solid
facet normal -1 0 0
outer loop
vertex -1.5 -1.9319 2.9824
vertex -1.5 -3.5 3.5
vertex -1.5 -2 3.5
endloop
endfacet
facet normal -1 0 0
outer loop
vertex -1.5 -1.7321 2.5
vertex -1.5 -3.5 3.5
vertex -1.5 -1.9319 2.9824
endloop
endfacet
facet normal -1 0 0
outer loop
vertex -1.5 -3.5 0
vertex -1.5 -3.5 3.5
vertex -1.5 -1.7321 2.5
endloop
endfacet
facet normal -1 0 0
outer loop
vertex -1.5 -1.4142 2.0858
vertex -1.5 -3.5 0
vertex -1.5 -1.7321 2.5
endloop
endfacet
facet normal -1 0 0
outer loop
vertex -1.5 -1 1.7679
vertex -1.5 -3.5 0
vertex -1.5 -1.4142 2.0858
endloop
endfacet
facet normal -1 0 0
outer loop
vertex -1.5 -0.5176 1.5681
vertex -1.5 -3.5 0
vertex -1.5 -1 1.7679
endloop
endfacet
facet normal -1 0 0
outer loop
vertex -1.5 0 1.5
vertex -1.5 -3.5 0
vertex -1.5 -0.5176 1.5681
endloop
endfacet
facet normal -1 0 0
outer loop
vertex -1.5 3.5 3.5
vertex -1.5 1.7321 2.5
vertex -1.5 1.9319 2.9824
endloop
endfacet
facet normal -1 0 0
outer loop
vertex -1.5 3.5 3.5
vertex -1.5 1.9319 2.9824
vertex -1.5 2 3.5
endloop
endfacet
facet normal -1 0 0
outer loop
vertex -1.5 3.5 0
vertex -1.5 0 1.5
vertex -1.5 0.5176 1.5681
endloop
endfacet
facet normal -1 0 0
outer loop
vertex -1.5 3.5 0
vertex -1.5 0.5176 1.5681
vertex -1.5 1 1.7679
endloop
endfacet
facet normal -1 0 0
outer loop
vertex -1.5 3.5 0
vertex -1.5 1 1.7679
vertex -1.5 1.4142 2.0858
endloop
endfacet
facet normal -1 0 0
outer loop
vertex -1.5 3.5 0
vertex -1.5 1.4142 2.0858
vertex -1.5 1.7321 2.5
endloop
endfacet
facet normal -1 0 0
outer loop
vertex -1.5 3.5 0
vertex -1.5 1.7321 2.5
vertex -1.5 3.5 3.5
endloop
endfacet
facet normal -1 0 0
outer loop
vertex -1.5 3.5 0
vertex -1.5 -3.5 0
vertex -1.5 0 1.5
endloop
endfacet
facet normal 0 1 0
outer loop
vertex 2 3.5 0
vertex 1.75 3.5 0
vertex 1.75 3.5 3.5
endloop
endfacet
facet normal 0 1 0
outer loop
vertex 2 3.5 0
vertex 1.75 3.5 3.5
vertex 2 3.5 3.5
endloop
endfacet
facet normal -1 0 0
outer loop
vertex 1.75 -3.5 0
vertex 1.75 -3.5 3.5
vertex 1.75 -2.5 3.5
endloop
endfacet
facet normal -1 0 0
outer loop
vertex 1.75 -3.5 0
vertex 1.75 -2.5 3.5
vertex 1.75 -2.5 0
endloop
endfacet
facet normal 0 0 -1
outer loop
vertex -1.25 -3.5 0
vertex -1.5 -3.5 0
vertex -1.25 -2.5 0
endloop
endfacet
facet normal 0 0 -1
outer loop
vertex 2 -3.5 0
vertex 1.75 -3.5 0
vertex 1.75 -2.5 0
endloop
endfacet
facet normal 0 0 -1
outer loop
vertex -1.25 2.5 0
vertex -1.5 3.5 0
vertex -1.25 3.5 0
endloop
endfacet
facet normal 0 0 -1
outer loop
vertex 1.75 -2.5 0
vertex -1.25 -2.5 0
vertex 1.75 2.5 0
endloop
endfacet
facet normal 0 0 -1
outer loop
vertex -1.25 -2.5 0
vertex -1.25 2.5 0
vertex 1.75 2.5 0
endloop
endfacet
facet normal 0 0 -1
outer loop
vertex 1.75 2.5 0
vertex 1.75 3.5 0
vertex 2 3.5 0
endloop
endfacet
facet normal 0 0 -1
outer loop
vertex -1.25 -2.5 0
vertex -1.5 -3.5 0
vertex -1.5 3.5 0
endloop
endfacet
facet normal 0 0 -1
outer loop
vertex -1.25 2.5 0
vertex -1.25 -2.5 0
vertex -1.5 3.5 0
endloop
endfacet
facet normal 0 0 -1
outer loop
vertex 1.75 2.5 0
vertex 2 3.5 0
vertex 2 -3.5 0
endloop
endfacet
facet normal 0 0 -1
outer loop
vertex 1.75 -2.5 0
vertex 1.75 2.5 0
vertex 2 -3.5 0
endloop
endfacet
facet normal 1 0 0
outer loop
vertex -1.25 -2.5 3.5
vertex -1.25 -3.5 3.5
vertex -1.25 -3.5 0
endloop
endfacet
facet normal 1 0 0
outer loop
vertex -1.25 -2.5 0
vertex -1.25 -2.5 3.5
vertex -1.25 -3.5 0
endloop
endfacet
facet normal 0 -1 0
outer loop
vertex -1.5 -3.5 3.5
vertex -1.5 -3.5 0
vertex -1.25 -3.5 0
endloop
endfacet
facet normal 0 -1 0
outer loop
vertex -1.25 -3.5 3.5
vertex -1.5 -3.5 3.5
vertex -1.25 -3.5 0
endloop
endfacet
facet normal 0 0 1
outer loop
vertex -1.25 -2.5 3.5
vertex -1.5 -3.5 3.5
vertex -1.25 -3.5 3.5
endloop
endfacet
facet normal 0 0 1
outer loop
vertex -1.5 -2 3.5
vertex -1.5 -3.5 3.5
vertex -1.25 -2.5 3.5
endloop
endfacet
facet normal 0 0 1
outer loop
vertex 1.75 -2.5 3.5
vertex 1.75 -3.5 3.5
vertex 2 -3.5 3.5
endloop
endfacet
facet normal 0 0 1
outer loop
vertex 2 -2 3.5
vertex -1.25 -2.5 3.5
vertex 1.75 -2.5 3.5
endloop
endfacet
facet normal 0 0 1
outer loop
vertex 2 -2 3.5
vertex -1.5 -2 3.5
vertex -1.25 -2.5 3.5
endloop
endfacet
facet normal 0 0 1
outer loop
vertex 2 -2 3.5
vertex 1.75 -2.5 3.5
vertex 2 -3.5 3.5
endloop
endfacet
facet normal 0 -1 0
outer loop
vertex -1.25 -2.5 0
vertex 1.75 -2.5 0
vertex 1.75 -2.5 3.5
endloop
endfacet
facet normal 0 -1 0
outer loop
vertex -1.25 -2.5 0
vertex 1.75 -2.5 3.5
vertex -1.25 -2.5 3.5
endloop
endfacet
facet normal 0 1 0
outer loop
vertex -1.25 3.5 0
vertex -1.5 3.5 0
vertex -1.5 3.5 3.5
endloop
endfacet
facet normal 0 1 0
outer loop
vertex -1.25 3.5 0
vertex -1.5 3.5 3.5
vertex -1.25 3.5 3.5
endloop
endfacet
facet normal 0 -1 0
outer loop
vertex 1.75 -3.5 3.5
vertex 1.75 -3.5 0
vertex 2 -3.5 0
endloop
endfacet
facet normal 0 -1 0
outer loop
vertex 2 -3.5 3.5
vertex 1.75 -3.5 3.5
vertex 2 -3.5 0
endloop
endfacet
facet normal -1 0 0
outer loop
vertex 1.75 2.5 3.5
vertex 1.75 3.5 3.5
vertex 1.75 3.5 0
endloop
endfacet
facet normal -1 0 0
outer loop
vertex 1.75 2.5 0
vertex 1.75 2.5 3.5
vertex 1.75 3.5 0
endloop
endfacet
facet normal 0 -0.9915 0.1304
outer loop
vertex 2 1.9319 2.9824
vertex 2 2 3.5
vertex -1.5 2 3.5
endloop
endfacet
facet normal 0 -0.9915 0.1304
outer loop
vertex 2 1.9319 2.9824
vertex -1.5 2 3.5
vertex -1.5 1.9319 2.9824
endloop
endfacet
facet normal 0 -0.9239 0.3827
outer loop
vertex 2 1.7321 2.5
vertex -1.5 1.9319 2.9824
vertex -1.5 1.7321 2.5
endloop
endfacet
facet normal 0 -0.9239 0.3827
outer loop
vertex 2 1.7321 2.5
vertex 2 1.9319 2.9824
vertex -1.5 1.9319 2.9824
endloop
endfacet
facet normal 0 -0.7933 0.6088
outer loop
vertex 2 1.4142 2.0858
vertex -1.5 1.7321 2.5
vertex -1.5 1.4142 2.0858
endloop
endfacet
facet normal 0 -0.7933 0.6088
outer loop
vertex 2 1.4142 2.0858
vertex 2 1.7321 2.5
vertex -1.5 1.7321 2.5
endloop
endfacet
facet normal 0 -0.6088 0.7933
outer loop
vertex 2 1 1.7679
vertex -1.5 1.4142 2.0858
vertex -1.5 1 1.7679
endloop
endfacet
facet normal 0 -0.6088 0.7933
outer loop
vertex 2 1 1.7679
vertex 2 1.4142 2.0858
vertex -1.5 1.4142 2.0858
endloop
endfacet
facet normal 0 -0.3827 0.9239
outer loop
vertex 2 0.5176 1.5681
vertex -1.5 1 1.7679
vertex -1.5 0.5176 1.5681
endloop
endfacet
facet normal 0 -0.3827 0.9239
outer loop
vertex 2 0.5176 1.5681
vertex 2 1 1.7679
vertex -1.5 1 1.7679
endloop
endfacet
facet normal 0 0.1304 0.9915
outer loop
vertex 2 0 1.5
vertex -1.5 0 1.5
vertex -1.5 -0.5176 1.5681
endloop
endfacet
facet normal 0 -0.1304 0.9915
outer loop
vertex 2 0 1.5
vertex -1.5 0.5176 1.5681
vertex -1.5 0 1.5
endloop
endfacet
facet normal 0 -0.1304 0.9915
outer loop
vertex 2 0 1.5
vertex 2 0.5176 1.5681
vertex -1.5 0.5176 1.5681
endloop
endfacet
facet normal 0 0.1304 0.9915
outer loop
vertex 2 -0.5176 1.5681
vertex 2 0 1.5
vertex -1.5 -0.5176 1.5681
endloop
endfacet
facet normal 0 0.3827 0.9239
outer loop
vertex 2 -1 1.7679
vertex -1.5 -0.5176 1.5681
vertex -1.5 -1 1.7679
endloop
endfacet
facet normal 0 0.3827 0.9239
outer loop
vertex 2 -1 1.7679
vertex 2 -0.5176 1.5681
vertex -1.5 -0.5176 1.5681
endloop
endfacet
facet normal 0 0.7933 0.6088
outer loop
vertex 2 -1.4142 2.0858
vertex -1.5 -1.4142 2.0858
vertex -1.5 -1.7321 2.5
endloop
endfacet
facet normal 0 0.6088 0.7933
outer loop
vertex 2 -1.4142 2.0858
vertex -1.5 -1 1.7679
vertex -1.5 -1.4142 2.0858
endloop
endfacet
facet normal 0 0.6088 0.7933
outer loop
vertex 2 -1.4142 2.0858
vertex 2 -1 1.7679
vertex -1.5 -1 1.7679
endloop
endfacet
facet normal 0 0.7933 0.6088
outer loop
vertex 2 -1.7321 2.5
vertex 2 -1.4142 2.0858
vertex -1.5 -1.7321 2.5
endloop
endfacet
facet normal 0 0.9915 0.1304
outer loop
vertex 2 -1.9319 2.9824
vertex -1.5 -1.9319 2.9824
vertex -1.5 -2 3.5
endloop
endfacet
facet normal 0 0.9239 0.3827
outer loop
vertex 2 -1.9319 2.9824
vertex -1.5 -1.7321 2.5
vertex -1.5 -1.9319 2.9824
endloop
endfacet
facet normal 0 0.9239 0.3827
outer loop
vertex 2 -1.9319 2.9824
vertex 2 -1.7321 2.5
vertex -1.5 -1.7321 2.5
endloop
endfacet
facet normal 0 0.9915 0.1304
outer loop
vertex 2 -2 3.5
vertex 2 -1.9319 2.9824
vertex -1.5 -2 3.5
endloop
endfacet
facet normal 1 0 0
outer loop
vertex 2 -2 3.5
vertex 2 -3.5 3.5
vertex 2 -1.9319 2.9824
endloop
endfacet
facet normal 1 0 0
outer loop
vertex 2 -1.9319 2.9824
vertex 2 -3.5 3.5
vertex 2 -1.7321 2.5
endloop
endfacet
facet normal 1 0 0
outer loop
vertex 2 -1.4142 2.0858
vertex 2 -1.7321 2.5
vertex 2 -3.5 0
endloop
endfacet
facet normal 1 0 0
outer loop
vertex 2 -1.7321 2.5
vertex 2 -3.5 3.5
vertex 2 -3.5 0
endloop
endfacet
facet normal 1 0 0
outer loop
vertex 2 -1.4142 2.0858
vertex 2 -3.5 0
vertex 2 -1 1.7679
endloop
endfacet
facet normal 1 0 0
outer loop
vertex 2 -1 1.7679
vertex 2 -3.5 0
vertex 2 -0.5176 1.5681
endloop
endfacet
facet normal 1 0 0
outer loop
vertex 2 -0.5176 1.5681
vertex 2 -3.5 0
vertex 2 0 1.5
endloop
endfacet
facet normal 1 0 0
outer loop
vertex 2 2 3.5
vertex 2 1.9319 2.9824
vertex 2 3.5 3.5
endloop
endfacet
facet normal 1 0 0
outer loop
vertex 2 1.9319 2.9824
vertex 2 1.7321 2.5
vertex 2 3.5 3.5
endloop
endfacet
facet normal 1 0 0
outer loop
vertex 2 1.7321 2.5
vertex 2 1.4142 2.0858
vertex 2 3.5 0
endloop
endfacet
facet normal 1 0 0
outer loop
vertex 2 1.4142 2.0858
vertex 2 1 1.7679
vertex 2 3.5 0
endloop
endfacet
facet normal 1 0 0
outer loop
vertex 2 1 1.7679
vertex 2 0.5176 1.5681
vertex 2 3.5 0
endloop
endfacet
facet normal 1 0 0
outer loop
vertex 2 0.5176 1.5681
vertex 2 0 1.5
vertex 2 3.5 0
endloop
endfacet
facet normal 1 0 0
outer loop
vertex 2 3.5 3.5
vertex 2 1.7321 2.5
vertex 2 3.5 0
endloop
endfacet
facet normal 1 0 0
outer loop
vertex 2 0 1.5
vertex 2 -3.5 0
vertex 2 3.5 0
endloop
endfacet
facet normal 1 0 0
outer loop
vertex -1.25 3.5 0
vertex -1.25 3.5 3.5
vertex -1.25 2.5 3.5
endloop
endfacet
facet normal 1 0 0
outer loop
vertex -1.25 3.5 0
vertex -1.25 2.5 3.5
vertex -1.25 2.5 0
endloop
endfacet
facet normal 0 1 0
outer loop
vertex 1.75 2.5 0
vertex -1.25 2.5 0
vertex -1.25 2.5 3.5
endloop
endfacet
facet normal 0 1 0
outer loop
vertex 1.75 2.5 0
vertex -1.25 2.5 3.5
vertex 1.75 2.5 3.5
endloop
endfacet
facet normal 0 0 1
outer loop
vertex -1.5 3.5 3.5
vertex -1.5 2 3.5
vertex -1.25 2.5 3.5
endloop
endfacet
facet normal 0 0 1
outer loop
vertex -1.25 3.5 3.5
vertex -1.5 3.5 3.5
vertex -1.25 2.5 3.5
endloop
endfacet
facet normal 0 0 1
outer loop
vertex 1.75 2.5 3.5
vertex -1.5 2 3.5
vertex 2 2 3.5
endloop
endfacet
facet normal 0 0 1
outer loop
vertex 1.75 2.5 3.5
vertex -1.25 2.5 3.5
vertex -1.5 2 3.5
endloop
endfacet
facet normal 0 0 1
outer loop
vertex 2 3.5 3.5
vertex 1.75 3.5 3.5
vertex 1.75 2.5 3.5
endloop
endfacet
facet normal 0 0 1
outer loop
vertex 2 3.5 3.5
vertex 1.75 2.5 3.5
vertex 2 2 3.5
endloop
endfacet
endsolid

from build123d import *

# Parameters (mm, degrees)
ESQUISSE1_W             = 3.5
ESQUISSE1_H             = 7
BOSS_EXTRU_1_DEPTH      = 3.5
ESQUISSE2_W             = 3
ESQUISSE2_H             = 3.5
ENL_V_MAT_EXTRU_1_DEPTH = 1
ESQUISSE3_W             = 3
ESQUISSE3_H             = 3.5
ENL_V_MAT_EXTRU_2_DEPTH = 1
ENL_V_MAT_EXTRU_4_DEPTH = 10


with BuildPart() as part:
    # Esquisse1 → Boss.-Extru.1 (new body)
    with BuildSketch(Plane.XY):
        with Locations((0.25, 0)):
            Rectangle(ESQUISSE1_W, ESQUISSE1_H)
    extrude(amount=BOSS_EXTRU_1_DEPTH)

    # Esquisse2 → Enlèv. mat.-Extru.1 (cut)
    with BuildSketch(Plane(origin=(0, 3.5, 0), x_dir=(1, 0, 0), z_dir=(0, 1, 0))):
        with Locations((0.25, -1.75)):
            Rectangle(ESQUISSE2_W, ESQUISSE2_H)
    extrude(amount=-ENL_V_MAT_EXTRU_1_DEPTH, mode=Mode.SUBTRACT)

    # Esquisse3 → Enlèv. mat.-Extru.2 (cut)
    with BuildSketch(Plane(origin=(0, -3.5, 0), x_dir=(-1, 0, 0), z_dir=(0, -1, 0))):
        with Locations((-0.25, -1.75)):
            Rectangle(ESQUISSE3_W, ESQUISSE3_H)
    extrude(amount=-ENL_V_MAT_EXTRU_2_DEPTH, mode=Mode.SUBTRACT)

    # Esquisse5 → Enlèv. mat.-Extru.4 (cut)
    with BuildSketch(Plane(origin=(2, 0, 0), x_dir=(0, 0, -1), z_dir=(1, 0, 0))):
        with BuildLine():
            Line((-3.5, -2), (-3.5, 2))
            ThreePointArc((-3.5, 2), (-1.5, 0), (-3.5, -2))
        make_face()
    extrude(amount=-ENL_V_MAT_EXTRU_4_DEPTH, mode=Mode.SUBTRACT)


solid = part.part
